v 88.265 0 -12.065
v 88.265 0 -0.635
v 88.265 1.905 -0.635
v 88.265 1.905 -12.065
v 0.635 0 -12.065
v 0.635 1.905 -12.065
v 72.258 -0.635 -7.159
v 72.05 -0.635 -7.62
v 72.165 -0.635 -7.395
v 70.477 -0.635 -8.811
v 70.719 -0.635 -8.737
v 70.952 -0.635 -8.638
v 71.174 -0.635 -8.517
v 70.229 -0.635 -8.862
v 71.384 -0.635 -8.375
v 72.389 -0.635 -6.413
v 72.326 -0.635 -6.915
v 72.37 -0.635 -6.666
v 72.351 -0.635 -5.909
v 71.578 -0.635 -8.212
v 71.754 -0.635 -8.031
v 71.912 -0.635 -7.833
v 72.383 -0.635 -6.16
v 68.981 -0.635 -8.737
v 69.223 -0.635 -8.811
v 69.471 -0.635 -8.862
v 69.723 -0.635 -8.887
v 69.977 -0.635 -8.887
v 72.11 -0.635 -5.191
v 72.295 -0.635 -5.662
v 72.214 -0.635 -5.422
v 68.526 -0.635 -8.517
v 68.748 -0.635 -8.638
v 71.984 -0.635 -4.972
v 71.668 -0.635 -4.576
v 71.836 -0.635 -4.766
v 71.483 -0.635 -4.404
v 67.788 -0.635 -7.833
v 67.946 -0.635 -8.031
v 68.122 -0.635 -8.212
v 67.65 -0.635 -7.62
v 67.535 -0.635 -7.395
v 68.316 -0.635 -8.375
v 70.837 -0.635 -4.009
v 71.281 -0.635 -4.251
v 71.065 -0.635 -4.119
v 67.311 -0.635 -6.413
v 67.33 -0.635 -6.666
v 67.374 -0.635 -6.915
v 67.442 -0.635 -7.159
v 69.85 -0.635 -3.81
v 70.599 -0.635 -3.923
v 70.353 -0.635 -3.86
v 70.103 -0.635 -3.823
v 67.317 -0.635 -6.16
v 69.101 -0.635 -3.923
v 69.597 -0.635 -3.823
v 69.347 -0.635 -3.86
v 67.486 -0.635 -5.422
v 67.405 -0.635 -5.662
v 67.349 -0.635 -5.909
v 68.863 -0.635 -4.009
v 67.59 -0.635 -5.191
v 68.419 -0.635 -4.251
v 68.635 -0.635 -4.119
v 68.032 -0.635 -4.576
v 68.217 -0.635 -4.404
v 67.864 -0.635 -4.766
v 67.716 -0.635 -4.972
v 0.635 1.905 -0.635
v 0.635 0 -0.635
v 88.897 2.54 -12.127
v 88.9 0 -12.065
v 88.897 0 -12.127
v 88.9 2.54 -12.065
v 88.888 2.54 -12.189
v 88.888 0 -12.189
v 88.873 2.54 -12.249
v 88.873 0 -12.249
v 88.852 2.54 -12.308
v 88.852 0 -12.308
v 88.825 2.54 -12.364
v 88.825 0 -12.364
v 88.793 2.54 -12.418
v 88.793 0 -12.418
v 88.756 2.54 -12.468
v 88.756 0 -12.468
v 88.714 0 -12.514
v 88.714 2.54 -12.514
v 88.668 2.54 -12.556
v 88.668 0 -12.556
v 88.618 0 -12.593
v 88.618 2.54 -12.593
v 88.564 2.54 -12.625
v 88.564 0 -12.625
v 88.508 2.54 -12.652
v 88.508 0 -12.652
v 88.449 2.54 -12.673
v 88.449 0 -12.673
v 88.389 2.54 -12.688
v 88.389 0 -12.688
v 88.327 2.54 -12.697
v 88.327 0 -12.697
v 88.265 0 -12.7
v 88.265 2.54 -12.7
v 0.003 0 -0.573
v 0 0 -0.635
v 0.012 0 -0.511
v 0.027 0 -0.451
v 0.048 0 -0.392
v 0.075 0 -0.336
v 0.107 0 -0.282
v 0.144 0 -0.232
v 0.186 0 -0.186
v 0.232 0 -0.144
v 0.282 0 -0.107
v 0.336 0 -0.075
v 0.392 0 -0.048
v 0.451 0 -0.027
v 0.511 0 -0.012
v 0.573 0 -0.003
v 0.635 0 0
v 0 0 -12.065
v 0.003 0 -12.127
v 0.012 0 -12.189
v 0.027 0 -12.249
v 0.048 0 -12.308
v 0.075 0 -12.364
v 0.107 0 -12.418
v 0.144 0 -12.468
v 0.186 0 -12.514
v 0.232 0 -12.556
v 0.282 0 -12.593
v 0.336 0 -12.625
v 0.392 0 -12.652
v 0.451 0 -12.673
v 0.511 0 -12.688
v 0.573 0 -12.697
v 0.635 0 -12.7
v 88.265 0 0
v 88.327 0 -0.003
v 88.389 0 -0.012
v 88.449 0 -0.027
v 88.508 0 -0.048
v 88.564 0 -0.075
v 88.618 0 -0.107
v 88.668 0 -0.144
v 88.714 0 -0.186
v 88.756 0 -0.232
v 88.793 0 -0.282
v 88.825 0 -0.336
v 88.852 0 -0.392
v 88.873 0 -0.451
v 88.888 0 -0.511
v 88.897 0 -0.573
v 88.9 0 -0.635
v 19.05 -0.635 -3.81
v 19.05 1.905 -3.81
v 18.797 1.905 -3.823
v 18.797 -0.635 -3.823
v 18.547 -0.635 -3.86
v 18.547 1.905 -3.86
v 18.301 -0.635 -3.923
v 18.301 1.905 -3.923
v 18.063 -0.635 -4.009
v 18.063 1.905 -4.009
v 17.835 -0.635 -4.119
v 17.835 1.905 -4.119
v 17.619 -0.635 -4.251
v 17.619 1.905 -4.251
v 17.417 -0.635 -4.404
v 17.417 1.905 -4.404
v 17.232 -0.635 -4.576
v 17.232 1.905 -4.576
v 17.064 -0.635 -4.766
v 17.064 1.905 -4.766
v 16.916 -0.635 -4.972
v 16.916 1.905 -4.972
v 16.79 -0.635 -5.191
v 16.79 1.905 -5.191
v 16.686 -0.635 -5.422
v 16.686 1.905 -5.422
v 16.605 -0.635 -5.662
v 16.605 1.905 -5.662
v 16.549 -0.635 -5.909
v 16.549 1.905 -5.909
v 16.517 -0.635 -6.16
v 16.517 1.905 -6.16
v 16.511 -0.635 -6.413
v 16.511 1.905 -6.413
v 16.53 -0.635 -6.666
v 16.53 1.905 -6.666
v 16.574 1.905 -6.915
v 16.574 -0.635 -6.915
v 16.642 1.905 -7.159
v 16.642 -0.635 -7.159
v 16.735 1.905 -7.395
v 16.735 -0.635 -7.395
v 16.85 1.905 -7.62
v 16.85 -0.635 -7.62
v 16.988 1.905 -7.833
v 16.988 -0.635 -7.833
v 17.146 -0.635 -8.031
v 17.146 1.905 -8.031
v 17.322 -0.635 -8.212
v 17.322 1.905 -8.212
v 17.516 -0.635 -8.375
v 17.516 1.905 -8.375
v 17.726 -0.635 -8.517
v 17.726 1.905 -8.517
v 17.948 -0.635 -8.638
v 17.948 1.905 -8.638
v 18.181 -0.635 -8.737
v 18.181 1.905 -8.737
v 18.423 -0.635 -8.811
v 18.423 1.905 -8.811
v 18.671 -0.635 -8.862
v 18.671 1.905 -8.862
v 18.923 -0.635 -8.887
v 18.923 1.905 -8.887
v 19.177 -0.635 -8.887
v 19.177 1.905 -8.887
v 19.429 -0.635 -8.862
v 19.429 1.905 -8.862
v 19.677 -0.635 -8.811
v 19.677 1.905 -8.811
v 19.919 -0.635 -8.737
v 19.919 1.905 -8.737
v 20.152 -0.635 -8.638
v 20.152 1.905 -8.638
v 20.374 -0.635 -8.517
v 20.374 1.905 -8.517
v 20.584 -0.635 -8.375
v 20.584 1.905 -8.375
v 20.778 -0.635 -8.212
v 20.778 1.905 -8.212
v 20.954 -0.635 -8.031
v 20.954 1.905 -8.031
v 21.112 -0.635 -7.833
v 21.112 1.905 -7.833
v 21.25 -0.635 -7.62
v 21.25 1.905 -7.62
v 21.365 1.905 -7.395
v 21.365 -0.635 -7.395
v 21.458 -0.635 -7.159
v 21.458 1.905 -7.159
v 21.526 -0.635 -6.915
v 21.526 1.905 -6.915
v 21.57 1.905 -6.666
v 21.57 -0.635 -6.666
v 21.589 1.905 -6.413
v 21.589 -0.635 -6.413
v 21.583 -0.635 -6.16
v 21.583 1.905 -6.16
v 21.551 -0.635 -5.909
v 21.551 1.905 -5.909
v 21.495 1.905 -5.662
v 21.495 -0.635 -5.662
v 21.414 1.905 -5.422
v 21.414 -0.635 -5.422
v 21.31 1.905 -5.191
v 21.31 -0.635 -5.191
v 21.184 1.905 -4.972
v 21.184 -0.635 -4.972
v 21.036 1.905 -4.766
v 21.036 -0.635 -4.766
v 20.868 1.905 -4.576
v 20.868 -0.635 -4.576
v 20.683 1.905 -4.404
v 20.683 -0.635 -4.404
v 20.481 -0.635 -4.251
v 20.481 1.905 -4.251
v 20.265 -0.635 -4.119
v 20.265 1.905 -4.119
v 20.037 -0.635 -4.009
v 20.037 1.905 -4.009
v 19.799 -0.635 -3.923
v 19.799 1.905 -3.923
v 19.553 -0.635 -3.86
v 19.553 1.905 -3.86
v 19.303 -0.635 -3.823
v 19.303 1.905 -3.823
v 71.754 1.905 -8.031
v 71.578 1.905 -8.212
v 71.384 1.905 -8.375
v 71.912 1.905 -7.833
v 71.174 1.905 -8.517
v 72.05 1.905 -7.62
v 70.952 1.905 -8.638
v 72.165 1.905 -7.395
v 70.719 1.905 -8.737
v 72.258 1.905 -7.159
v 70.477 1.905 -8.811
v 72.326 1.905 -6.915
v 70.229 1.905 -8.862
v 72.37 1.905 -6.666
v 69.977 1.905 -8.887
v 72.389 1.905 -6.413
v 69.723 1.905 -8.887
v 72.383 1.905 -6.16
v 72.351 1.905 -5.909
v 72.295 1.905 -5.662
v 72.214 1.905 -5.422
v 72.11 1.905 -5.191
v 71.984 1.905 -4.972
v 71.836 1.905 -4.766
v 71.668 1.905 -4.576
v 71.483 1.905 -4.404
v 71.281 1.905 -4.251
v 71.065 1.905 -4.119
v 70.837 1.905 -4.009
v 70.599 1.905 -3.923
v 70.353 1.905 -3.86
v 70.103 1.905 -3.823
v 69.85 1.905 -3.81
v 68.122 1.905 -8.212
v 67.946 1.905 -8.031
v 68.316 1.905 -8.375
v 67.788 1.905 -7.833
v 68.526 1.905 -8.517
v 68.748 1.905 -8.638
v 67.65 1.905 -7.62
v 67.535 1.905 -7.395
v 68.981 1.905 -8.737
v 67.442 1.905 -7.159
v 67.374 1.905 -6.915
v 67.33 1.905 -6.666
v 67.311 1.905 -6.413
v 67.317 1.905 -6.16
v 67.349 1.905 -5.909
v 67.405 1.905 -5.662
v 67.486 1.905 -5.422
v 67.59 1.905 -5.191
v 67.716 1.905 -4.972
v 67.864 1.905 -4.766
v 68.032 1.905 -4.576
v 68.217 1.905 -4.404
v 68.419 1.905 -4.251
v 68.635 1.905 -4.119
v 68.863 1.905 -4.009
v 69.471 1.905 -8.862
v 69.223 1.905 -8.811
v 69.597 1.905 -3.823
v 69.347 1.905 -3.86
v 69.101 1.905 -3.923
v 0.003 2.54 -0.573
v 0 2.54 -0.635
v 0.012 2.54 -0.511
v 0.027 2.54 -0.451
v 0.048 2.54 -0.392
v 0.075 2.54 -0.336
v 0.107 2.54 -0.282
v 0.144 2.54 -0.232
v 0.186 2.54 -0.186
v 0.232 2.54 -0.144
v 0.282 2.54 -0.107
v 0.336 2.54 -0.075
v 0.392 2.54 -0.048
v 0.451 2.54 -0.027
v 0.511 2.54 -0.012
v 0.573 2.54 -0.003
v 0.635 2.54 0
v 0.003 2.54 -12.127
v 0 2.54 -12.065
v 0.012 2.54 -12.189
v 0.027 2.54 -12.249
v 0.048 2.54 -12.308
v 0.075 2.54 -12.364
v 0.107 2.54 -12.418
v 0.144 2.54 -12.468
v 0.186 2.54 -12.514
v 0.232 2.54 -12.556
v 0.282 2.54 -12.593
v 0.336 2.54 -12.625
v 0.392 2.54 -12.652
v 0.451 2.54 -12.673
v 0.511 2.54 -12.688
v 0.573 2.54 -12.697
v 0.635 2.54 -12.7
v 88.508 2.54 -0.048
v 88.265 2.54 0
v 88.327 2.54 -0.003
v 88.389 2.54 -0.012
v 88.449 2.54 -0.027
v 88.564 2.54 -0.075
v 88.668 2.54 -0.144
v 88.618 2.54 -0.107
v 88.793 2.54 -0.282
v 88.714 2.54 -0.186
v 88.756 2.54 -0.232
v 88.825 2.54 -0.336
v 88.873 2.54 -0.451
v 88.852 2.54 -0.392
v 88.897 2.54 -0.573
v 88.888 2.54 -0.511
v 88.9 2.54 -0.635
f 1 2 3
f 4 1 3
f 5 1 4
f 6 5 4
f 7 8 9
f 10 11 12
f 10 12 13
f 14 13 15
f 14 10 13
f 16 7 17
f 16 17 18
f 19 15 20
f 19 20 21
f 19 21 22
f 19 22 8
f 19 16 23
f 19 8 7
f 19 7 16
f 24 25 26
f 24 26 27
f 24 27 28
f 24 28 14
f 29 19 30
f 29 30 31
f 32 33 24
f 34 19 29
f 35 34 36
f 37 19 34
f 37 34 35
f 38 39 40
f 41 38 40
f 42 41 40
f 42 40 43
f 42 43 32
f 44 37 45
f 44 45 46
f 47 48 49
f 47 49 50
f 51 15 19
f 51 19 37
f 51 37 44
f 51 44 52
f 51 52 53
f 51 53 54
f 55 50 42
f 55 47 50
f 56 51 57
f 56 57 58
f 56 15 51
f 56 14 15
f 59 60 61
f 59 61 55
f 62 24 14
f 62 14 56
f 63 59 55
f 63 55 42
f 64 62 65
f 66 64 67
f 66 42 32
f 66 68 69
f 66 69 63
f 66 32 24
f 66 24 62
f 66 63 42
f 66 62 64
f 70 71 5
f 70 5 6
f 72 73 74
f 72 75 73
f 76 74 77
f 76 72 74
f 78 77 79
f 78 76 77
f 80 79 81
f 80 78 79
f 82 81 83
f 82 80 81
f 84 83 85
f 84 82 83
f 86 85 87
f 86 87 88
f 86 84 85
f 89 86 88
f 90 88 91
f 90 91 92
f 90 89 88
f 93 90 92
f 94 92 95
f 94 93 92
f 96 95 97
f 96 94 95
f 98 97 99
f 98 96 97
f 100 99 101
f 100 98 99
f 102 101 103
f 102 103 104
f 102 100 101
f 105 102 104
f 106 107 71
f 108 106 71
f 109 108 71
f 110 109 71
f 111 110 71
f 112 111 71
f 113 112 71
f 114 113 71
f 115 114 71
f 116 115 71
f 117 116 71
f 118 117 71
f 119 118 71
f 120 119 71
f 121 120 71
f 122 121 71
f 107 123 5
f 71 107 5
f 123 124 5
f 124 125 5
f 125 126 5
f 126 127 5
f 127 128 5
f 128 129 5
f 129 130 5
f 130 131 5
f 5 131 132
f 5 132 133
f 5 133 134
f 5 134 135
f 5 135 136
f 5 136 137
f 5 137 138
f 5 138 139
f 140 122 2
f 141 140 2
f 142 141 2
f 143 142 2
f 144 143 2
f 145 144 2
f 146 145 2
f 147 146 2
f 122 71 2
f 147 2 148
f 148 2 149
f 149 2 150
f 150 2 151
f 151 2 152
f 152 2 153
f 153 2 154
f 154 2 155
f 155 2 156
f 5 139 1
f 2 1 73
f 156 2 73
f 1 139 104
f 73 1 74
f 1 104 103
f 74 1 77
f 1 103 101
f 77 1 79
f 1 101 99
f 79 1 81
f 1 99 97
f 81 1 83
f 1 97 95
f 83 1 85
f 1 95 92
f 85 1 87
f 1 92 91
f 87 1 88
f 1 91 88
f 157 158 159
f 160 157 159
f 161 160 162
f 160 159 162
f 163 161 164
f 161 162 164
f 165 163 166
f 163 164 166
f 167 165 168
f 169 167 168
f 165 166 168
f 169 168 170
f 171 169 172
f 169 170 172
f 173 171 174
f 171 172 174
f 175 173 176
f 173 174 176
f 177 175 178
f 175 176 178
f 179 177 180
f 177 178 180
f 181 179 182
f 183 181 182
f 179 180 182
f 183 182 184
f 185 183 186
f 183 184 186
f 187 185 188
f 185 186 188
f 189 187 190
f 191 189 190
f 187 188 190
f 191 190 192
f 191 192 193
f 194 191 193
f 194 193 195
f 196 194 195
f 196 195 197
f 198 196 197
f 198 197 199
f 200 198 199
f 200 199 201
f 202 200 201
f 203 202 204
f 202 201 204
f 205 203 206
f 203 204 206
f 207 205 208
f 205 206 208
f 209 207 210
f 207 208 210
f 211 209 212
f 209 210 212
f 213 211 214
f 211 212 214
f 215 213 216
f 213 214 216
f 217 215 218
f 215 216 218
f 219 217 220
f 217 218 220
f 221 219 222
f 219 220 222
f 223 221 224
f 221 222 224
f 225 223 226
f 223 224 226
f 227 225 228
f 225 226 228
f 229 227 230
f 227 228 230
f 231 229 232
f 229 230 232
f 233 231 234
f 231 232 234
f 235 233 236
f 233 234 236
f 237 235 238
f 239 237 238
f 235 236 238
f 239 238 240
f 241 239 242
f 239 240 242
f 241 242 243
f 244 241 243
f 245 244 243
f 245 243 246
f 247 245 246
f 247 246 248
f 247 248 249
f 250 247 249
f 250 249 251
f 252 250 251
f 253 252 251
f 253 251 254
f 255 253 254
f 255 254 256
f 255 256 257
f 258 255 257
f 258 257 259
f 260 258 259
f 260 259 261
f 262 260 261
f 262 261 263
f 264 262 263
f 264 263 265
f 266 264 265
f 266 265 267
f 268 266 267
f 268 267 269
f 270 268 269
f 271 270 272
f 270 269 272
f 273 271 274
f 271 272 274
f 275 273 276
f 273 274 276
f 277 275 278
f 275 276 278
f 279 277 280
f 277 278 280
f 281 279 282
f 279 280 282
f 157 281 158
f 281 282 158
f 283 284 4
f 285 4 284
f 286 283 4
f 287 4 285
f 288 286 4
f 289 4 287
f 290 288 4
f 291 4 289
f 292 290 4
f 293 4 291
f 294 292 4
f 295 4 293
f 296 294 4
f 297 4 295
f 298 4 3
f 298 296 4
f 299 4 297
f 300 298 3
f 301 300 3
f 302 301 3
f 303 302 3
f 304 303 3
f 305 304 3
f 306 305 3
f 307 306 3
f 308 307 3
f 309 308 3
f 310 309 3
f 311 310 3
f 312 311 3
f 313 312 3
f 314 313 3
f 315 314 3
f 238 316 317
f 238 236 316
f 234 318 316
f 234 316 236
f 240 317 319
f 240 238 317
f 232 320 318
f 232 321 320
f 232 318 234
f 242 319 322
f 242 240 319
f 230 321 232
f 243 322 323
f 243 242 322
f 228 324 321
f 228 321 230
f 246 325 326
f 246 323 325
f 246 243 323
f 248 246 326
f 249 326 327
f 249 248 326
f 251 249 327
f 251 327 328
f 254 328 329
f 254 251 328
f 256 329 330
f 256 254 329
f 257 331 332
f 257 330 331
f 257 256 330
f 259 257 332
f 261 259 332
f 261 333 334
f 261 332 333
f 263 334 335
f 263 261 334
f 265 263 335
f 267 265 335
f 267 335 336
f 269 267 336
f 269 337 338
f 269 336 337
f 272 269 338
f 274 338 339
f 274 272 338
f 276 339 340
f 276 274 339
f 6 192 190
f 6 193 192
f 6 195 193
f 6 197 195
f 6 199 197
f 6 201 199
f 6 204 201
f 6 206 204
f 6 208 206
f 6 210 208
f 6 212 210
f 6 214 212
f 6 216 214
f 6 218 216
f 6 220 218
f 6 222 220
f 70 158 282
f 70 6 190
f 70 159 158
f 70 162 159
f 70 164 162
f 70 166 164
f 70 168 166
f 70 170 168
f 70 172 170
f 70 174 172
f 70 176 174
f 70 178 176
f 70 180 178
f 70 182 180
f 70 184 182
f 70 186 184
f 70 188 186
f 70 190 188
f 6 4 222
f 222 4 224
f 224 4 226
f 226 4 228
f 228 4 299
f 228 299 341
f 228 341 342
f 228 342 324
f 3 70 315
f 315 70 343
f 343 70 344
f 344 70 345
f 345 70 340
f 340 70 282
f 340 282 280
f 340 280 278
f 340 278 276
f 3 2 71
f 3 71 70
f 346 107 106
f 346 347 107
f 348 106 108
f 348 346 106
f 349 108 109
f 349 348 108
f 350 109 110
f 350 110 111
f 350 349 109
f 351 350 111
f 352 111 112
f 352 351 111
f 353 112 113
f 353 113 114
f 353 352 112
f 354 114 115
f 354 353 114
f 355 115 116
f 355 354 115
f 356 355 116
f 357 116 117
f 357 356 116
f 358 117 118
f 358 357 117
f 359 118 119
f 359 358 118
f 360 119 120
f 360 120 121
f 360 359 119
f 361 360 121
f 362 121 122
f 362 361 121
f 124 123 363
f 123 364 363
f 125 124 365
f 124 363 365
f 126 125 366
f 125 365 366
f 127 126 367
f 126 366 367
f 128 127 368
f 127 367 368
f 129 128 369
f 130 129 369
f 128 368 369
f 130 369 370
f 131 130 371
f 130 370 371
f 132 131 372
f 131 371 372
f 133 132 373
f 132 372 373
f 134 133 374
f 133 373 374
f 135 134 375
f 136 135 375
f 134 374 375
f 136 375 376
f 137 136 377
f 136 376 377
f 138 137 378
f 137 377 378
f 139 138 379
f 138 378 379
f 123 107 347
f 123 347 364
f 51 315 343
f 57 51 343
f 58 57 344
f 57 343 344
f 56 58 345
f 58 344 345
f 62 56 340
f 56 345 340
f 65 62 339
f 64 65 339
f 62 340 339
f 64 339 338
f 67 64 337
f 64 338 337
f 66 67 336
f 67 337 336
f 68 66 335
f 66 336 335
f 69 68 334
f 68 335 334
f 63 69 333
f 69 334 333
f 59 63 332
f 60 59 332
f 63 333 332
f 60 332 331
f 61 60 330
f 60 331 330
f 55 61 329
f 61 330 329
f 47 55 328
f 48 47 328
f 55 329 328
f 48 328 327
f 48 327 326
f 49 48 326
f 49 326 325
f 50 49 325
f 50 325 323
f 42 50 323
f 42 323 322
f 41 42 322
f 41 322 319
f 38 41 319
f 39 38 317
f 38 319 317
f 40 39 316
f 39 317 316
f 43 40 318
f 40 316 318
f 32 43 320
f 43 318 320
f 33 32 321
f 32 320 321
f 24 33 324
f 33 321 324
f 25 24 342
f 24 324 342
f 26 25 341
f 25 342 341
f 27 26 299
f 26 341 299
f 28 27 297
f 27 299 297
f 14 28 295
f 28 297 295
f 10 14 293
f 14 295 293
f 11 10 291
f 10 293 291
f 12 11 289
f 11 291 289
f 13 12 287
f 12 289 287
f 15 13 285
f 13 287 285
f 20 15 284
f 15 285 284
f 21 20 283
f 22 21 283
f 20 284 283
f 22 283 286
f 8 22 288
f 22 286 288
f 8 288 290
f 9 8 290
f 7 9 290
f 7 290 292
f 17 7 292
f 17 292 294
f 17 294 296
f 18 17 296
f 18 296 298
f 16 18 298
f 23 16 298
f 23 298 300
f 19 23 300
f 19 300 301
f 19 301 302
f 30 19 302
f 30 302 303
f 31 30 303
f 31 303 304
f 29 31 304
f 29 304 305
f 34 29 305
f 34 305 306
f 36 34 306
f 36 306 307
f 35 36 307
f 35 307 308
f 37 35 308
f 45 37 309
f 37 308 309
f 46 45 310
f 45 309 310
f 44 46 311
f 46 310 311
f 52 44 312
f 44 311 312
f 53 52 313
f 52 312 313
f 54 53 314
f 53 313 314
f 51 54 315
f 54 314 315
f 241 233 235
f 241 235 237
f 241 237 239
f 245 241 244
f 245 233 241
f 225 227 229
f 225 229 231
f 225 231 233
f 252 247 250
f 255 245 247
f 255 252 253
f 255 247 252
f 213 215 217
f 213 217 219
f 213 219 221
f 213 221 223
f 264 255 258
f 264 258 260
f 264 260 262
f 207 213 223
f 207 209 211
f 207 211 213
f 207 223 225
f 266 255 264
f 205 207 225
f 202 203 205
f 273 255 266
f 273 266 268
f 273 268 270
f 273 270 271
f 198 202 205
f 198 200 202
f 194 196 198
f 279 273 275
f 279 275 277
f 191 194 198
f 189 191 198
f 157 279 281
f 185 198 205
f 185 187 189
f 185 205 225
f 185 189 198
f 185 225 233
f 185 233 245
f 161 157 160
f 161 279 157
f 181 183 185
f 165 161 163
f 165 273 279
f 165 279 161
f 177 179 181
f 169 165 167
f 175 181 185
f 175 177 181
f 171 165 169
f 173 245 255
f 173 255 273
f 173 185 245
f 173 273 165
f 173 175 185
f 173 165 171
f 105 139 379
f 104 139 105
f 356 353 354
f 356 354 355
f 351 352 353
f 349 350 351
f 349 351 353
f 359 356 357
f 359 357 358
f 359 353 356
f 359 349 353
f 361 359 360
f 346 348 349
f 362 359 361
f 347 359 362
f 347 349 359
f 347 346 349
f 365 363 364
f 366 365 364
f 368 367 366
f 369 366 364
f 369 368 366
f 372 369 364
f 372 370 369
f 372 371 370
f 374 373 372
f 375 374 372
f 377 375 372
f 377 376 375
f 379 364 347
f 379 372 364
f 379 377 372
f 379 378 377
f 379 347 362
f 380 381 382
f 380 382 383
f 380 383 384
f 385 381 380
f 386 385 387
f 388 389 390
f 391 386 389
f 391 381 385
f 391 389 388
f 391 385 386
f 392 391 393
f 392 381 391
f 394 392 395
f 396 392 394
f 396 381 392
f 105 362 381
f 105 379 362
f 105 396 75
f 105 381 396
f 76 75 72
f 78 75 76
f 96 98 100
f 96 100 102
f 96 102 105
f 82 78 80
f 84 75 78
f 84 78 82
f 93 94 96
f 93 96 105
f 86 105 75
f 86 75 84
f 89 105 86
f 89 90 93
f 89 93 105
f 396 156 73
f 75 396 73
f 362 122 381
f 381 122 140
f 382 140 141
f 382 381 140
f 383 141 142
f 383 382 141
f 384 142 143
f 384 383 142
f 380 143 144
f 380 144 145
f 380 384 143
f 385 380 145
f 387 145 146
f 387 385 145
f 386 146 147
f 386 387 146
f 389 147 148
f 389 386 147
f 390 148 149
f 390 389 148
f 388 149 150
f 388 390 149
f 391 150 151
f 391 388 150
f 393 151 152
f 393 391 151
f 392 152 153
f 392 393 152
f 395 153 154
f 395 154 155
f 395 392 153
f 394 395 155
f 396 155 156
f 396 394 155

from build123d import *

# Parameters (mm, degrees)
SKETCH1_W           = 88.9
SKETCH1_H           = 12.7
BOSS_EXTRUDE1_DEPTH = 2.54
FILLET1_R           = 0.635
SHELL1_START        = 0.635
SHELL1_OUTLINE_W    = 1.905
SHELL1_OUTLINE_H    = 11.43
SHELL1_DEPTH        = 87.63
SKETCH2_R           = 2.54
BOSS_EXTRUDE2_DEPTH = 2.54


# Read off the part's stored shape, not the designer's step: Shell1
with BuildPart() as part:
    # Sketch1 → Boss-Extrude1 (new body)
    with BuildSketch(Plane(origin=(0, 0, 0), x_dir=(1, 0, 0), z_dir=(0, 1, 0))):
        with Locations((44.45, 6.35)):
            Rectangle(SKETCH1_W, SKETCH1_H)
    extrude(amount=BOSS_EXTRUDE1_DEPTH)

    # Fillet1
    fillet1_edges = [part.edges().sort_by_distance(p)[0] for p in [
        (0, 1.27, -12.7),
        (88.9, 1.27, -12.7),
        (88.9, 1.27, 0),
        (0, 1.27, 0),
    ]]
    fillet(fillet1_edges, radius=FILLET1_R)

    # Shell1 outline → Shell1 (cut)
    with BuildSketch(Plane.YZ.offset(SHELL1_START)):
        with Locations((0.9525, -6.35)):
            Rectangle(SHELL1_OUTLINE_W, SHELL1_OUTLINE_H)
    extrude(amount=SHELL1_DEPTH, mode=Mode.SUBTRACT)

    # Sketch2 → Boss-Extrude2 (add)
    with BuildSketch(Plane(origin=(0, 1.905, 0), x_dir=(-1, 0, 0), z_dir=(0, -1, 0))):
        with Locations(Location((-69.85, 6.35, 0), (0, 0, 270))):
            Circle(SKETCH2_R)
        with Locations(Location((-19.05, 6.35, 0), (0, 0, 270))):
            Circle(SKETCH2_R)
    extrude(amount=BOSS_EXTRUDE2_DEPTH)


solid = part.part
